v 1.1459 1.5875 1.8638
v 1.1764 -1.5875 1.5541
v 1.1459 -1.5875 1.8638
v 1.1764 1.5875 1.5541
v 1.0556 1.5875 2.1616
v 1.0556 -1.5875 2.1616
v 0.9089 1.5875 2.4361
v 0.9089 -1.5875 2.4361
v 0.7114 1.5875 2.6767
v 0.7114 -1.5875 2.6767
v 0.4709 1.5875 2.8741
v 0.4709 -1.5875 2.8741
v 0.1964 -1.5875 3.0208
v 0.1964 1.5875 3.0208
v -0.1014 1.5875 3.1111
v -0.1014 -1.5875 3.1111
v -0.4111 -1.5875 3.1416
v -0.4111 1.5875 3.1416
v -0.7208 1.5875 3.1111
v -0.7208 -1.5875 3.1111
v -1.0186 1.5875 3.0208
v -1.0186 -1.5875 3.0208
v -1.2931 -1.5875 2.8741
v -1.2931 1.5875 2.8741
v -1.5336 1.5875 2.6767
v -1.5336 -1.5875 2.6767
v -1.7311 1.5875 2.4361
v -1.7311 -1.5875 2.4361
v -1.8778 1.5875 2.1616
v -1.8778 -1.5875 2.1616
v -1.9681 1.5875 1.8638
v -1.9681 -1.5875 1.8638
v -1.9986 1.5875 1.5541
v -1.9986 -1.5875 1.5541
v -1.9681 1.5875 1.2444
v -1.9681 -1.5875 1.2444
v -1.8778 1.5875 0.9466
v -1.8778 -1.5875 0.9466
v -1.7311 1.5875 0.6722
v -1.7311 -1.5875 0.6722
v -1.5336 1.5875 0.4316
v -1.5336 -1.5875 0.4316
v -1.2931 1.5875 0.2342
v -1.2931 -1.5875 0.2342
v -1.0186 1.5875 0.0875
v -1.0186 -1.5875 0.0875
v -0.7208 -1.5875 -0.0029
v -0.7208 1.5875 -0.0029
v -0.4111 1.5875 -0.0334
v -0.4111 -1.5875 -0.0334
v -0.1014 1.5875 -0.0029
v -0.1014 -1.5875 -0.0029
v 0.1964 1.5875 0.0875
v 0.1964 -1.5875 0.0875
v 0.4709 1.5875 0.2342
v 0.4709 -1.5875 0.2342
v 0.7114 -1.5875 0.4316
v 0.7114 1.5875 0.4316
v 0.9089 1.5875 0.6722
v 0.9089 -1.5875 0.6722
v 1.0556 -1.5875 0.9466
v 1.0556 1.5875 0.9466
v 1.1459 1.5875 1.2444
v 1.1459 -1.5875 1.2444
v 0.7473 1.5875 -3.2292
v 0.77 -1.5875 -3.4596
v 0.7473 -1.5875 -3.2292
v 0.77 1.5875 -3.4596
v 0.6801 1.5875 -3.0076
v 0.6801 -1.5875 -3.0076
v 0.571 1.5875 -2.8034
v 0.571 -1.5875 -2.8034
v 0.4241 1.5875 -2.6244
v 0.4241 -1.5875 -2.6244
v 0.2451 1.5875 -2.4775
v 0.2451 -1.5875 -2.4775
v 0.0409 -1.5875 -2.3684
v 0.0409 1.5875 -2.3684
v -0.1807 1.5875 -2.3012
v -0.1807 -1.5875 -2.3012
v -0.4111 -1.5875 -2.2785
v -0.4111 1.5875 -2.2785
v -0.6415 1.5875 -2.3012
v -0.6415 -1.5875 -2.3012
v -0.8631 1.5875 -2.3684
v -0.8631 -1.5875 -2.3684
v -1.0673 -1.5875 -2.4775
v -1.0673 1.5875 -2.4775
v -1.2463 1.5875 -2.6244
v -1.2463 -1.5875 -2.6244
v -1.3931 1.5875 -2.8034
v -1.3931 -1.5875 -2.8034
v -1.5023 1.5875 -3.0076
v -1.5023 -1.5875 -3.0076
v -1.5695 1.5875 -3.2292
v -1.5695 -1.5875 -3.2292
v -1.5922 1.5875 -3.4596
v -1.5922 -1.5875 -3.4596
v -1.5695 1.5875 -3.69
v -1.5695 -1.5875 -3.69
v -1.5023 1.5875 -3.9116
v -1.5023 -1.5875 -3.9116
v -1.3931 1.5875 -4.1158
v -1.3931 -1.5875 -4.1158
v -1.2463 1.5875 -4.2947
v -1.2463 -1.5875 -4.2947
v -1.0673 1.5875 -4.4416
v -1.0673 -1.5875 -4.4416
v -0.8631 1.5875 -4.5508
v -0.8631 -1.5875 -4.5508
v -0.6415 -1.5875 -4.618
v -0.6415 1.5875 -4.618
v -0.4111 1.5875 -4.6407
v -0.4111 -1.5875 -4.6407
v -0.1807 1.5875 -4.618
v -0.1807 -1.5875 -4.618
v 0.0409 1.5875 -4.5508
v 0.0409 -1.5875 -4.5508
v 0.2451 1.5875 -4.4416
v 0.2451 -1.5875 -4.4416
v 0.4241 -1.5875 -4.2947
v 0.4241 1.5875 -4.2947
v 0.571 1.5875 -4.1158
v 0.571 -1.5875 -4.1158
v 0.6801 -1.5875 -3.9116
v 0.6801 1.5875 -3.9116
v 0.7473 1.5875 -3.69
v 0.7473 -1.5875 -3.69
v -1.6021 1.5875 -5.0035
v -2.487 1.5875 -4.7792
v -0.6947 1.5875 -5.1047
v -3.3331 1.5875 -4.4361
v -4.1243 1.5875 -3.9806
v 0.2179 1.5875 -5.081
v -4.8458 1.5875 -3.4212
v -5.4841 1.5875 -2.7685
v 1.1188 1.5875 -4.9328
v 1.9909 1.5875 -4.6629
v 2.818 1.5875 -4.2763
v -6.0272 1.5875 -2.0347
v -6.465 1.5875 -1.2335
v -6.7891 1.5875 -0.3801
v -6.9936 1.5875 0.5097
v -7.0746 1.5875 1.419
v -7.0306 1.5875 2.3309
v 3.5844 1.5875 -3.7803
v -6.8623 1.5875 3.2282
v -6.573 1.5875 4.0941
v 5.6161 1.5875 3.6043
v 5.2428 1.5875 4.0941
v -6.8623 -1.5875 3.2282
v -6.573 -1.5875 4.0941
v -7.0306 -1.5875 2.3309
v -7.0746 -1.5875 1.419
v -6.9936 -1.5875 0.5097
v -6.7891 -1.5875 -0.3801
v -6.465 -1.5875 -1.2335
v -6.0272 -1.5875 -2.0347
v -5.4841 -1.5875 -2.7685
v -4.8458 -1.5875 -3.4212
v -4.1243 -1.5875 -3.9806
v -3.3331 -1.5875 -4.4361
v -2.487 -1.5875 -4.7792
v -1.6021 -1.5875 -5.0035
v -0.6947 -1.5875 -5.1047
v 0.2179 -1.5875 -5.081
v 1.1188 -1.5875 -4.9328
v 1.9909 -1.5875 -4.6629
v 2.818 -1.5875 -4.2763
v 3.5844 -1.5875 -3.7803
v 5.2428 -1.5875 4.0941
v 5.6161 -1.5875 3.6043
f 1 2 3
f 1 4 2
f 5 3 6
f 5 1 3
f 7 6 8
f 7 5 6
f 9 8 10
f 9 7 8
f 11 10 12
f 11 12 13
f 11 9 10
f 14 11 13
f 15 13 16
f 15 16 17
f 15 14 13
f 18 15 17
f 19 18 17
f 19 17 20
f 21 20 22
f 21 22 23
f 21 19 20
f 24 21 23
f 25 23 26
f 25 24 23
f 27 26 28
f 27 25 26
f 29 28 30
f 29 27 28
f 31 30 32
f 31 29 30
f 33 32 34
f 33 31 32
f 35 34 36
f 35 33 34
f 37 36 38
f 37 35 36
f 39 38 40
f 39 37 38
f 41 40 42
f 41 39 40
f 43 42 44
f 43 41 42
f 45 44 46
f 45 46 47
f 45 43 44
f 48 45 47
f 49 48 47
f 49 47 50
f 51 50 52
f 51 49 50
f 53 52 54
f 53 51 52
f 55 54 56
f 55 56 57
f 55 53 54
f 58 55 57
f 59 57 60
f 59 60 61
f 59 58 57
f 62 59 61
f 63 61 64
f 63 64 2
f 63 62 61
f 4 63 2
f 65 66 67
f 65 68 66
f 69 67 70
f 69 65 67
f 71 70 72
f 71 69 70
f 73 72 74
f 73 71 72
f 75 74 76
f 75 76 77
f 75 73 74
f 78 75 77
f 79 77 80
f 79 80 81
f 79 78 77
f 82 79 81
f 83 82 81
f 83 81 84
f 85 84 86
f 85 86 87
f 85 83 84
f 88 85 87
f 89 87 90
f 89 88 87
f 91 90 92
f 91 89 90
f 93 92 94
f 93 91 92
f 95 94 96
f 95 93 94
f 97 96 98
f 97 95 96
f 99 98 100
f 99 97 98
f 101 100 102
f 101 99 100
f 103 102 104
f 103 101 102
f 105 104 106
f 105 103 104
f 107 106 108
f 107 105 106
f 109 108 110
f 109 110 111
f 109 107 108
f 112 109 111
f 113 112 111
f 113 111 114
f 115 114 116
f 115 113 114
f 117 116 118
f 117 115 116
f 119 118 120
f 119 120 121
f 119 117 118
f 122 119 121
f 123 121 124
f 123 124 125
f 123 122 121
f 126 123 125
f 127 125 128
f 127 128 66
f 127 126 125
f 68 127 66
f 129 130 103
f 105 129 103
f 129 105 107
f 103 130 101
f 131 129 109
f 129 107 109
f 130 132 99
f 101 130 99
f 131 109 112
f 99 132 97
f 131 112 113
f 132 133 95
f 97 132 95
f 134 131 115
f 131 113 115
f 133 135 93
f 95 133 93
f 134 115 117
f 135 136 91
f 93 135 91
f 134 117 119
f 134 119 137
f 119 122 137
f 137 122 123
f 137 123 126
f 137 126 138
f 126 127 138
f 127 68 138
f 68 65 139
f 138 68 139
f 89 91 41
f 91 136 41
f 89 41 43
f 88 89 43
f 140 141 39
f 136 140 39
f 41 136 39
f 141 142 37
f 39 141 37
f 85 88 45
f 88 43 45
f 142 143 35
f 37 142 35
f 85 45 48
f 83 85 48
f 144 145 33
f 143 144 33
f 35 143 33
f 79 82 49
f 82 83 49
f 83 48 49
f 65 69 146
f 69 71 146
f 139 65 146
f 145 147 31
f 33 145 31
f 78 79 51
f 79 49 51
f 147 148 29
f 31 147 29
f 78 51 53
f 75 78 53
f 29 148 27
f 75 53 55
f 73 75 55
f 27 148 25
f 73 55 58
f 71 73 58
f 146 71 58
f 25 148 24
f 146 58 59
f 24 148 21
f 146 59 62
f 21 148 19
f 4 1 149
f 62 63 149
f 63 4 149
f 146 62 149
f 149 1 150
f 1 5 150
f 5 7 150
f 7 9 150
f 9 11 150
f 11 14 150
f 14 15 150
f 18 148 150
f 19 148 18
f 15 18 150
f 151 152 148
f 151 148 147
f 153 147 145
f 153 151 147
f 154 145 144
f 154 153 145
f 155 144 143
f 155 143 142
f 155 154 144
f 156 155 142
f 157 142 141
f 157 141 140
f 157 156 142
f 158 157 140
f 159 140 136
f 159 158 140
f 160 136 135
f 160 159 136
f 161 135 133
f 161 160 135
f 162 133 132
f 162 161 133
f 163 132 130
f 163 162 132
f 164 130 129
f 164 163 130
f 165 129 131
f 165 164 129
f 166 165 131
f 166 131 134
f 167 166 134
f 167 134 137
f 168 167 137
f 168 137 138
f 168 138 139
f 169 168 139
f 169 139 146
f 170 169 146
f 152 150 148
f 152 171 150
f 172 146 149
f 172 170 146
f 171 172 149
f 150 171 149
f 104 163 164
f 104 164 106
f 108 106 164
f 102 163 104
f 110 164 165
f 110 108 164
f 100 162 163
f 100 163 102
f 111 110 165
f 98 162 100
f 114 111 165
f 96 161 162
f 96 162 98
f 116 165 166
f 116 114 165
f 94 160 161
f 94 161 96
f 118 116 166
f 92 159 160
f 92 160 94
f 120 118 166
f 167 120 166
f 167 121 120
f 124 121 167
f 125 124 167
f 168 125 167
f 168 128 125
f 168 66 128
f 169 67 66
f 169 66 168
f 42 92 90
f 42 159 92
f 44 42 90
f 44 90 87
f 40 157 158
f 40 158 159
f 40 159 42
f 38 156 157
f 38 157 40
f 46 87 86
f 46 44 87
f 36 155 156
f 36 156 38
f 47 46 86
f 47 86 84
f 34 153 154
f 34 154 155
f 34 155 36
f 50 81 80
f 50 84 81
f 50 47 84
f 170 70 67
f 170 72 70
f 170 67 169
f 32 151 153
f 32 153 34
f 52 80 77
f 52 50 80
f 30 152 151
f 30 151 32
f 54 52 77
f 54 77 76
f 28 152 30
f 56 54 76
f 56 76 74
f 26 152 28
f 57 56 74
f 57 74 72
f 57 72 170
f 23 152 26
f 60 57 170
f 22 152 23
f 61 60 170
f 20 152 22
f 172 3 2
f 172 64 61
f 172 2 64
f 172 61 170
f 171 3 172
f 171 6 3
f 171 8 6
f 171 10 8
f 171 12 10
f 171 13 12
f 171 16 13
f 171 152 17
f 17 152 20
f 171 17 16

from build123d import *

# Parameters (mm, degrees)
F0_R     = 1.1811
F0_R_2   = 1.5875
F1_DEPTH = 1.5875
F2_SIZE  = 0.508


with BuildPart() as f1:
    # F0 (on Front) → F1 (new body, symmetric)
    with BuildSketch(Plane.XZ):
        with BuildLine():
            Line((5.750813, 4.094138), (-6.573008, 4.094138))
            ThreePointArc((-6.573008, 4.094138), (-4.49461, -3.713278), (3.584436, -3.780322))
            Line((3.584436, -3.780322), (5.750813, 4.094138))
        make_face()
        with Locations((-0.411098, -3.459583)):
            Circle(F0_R, mode=Mode.SUBTRACT)
        with Locations((-0.411098, 1.554138)):
            Circle(F0_R_2, mode=Mode.SUBTRACT)
    extrude(amount=F1_DEPTH, both=True)

    # F2
    f2_edges = [f1.edges().sort_by_distance(p)[0] for p in [
        (5.750813, 0, 4.094138),
    ]]
    chamfer(f2_edges, length=F2_SIZE)


solid = f1.part
